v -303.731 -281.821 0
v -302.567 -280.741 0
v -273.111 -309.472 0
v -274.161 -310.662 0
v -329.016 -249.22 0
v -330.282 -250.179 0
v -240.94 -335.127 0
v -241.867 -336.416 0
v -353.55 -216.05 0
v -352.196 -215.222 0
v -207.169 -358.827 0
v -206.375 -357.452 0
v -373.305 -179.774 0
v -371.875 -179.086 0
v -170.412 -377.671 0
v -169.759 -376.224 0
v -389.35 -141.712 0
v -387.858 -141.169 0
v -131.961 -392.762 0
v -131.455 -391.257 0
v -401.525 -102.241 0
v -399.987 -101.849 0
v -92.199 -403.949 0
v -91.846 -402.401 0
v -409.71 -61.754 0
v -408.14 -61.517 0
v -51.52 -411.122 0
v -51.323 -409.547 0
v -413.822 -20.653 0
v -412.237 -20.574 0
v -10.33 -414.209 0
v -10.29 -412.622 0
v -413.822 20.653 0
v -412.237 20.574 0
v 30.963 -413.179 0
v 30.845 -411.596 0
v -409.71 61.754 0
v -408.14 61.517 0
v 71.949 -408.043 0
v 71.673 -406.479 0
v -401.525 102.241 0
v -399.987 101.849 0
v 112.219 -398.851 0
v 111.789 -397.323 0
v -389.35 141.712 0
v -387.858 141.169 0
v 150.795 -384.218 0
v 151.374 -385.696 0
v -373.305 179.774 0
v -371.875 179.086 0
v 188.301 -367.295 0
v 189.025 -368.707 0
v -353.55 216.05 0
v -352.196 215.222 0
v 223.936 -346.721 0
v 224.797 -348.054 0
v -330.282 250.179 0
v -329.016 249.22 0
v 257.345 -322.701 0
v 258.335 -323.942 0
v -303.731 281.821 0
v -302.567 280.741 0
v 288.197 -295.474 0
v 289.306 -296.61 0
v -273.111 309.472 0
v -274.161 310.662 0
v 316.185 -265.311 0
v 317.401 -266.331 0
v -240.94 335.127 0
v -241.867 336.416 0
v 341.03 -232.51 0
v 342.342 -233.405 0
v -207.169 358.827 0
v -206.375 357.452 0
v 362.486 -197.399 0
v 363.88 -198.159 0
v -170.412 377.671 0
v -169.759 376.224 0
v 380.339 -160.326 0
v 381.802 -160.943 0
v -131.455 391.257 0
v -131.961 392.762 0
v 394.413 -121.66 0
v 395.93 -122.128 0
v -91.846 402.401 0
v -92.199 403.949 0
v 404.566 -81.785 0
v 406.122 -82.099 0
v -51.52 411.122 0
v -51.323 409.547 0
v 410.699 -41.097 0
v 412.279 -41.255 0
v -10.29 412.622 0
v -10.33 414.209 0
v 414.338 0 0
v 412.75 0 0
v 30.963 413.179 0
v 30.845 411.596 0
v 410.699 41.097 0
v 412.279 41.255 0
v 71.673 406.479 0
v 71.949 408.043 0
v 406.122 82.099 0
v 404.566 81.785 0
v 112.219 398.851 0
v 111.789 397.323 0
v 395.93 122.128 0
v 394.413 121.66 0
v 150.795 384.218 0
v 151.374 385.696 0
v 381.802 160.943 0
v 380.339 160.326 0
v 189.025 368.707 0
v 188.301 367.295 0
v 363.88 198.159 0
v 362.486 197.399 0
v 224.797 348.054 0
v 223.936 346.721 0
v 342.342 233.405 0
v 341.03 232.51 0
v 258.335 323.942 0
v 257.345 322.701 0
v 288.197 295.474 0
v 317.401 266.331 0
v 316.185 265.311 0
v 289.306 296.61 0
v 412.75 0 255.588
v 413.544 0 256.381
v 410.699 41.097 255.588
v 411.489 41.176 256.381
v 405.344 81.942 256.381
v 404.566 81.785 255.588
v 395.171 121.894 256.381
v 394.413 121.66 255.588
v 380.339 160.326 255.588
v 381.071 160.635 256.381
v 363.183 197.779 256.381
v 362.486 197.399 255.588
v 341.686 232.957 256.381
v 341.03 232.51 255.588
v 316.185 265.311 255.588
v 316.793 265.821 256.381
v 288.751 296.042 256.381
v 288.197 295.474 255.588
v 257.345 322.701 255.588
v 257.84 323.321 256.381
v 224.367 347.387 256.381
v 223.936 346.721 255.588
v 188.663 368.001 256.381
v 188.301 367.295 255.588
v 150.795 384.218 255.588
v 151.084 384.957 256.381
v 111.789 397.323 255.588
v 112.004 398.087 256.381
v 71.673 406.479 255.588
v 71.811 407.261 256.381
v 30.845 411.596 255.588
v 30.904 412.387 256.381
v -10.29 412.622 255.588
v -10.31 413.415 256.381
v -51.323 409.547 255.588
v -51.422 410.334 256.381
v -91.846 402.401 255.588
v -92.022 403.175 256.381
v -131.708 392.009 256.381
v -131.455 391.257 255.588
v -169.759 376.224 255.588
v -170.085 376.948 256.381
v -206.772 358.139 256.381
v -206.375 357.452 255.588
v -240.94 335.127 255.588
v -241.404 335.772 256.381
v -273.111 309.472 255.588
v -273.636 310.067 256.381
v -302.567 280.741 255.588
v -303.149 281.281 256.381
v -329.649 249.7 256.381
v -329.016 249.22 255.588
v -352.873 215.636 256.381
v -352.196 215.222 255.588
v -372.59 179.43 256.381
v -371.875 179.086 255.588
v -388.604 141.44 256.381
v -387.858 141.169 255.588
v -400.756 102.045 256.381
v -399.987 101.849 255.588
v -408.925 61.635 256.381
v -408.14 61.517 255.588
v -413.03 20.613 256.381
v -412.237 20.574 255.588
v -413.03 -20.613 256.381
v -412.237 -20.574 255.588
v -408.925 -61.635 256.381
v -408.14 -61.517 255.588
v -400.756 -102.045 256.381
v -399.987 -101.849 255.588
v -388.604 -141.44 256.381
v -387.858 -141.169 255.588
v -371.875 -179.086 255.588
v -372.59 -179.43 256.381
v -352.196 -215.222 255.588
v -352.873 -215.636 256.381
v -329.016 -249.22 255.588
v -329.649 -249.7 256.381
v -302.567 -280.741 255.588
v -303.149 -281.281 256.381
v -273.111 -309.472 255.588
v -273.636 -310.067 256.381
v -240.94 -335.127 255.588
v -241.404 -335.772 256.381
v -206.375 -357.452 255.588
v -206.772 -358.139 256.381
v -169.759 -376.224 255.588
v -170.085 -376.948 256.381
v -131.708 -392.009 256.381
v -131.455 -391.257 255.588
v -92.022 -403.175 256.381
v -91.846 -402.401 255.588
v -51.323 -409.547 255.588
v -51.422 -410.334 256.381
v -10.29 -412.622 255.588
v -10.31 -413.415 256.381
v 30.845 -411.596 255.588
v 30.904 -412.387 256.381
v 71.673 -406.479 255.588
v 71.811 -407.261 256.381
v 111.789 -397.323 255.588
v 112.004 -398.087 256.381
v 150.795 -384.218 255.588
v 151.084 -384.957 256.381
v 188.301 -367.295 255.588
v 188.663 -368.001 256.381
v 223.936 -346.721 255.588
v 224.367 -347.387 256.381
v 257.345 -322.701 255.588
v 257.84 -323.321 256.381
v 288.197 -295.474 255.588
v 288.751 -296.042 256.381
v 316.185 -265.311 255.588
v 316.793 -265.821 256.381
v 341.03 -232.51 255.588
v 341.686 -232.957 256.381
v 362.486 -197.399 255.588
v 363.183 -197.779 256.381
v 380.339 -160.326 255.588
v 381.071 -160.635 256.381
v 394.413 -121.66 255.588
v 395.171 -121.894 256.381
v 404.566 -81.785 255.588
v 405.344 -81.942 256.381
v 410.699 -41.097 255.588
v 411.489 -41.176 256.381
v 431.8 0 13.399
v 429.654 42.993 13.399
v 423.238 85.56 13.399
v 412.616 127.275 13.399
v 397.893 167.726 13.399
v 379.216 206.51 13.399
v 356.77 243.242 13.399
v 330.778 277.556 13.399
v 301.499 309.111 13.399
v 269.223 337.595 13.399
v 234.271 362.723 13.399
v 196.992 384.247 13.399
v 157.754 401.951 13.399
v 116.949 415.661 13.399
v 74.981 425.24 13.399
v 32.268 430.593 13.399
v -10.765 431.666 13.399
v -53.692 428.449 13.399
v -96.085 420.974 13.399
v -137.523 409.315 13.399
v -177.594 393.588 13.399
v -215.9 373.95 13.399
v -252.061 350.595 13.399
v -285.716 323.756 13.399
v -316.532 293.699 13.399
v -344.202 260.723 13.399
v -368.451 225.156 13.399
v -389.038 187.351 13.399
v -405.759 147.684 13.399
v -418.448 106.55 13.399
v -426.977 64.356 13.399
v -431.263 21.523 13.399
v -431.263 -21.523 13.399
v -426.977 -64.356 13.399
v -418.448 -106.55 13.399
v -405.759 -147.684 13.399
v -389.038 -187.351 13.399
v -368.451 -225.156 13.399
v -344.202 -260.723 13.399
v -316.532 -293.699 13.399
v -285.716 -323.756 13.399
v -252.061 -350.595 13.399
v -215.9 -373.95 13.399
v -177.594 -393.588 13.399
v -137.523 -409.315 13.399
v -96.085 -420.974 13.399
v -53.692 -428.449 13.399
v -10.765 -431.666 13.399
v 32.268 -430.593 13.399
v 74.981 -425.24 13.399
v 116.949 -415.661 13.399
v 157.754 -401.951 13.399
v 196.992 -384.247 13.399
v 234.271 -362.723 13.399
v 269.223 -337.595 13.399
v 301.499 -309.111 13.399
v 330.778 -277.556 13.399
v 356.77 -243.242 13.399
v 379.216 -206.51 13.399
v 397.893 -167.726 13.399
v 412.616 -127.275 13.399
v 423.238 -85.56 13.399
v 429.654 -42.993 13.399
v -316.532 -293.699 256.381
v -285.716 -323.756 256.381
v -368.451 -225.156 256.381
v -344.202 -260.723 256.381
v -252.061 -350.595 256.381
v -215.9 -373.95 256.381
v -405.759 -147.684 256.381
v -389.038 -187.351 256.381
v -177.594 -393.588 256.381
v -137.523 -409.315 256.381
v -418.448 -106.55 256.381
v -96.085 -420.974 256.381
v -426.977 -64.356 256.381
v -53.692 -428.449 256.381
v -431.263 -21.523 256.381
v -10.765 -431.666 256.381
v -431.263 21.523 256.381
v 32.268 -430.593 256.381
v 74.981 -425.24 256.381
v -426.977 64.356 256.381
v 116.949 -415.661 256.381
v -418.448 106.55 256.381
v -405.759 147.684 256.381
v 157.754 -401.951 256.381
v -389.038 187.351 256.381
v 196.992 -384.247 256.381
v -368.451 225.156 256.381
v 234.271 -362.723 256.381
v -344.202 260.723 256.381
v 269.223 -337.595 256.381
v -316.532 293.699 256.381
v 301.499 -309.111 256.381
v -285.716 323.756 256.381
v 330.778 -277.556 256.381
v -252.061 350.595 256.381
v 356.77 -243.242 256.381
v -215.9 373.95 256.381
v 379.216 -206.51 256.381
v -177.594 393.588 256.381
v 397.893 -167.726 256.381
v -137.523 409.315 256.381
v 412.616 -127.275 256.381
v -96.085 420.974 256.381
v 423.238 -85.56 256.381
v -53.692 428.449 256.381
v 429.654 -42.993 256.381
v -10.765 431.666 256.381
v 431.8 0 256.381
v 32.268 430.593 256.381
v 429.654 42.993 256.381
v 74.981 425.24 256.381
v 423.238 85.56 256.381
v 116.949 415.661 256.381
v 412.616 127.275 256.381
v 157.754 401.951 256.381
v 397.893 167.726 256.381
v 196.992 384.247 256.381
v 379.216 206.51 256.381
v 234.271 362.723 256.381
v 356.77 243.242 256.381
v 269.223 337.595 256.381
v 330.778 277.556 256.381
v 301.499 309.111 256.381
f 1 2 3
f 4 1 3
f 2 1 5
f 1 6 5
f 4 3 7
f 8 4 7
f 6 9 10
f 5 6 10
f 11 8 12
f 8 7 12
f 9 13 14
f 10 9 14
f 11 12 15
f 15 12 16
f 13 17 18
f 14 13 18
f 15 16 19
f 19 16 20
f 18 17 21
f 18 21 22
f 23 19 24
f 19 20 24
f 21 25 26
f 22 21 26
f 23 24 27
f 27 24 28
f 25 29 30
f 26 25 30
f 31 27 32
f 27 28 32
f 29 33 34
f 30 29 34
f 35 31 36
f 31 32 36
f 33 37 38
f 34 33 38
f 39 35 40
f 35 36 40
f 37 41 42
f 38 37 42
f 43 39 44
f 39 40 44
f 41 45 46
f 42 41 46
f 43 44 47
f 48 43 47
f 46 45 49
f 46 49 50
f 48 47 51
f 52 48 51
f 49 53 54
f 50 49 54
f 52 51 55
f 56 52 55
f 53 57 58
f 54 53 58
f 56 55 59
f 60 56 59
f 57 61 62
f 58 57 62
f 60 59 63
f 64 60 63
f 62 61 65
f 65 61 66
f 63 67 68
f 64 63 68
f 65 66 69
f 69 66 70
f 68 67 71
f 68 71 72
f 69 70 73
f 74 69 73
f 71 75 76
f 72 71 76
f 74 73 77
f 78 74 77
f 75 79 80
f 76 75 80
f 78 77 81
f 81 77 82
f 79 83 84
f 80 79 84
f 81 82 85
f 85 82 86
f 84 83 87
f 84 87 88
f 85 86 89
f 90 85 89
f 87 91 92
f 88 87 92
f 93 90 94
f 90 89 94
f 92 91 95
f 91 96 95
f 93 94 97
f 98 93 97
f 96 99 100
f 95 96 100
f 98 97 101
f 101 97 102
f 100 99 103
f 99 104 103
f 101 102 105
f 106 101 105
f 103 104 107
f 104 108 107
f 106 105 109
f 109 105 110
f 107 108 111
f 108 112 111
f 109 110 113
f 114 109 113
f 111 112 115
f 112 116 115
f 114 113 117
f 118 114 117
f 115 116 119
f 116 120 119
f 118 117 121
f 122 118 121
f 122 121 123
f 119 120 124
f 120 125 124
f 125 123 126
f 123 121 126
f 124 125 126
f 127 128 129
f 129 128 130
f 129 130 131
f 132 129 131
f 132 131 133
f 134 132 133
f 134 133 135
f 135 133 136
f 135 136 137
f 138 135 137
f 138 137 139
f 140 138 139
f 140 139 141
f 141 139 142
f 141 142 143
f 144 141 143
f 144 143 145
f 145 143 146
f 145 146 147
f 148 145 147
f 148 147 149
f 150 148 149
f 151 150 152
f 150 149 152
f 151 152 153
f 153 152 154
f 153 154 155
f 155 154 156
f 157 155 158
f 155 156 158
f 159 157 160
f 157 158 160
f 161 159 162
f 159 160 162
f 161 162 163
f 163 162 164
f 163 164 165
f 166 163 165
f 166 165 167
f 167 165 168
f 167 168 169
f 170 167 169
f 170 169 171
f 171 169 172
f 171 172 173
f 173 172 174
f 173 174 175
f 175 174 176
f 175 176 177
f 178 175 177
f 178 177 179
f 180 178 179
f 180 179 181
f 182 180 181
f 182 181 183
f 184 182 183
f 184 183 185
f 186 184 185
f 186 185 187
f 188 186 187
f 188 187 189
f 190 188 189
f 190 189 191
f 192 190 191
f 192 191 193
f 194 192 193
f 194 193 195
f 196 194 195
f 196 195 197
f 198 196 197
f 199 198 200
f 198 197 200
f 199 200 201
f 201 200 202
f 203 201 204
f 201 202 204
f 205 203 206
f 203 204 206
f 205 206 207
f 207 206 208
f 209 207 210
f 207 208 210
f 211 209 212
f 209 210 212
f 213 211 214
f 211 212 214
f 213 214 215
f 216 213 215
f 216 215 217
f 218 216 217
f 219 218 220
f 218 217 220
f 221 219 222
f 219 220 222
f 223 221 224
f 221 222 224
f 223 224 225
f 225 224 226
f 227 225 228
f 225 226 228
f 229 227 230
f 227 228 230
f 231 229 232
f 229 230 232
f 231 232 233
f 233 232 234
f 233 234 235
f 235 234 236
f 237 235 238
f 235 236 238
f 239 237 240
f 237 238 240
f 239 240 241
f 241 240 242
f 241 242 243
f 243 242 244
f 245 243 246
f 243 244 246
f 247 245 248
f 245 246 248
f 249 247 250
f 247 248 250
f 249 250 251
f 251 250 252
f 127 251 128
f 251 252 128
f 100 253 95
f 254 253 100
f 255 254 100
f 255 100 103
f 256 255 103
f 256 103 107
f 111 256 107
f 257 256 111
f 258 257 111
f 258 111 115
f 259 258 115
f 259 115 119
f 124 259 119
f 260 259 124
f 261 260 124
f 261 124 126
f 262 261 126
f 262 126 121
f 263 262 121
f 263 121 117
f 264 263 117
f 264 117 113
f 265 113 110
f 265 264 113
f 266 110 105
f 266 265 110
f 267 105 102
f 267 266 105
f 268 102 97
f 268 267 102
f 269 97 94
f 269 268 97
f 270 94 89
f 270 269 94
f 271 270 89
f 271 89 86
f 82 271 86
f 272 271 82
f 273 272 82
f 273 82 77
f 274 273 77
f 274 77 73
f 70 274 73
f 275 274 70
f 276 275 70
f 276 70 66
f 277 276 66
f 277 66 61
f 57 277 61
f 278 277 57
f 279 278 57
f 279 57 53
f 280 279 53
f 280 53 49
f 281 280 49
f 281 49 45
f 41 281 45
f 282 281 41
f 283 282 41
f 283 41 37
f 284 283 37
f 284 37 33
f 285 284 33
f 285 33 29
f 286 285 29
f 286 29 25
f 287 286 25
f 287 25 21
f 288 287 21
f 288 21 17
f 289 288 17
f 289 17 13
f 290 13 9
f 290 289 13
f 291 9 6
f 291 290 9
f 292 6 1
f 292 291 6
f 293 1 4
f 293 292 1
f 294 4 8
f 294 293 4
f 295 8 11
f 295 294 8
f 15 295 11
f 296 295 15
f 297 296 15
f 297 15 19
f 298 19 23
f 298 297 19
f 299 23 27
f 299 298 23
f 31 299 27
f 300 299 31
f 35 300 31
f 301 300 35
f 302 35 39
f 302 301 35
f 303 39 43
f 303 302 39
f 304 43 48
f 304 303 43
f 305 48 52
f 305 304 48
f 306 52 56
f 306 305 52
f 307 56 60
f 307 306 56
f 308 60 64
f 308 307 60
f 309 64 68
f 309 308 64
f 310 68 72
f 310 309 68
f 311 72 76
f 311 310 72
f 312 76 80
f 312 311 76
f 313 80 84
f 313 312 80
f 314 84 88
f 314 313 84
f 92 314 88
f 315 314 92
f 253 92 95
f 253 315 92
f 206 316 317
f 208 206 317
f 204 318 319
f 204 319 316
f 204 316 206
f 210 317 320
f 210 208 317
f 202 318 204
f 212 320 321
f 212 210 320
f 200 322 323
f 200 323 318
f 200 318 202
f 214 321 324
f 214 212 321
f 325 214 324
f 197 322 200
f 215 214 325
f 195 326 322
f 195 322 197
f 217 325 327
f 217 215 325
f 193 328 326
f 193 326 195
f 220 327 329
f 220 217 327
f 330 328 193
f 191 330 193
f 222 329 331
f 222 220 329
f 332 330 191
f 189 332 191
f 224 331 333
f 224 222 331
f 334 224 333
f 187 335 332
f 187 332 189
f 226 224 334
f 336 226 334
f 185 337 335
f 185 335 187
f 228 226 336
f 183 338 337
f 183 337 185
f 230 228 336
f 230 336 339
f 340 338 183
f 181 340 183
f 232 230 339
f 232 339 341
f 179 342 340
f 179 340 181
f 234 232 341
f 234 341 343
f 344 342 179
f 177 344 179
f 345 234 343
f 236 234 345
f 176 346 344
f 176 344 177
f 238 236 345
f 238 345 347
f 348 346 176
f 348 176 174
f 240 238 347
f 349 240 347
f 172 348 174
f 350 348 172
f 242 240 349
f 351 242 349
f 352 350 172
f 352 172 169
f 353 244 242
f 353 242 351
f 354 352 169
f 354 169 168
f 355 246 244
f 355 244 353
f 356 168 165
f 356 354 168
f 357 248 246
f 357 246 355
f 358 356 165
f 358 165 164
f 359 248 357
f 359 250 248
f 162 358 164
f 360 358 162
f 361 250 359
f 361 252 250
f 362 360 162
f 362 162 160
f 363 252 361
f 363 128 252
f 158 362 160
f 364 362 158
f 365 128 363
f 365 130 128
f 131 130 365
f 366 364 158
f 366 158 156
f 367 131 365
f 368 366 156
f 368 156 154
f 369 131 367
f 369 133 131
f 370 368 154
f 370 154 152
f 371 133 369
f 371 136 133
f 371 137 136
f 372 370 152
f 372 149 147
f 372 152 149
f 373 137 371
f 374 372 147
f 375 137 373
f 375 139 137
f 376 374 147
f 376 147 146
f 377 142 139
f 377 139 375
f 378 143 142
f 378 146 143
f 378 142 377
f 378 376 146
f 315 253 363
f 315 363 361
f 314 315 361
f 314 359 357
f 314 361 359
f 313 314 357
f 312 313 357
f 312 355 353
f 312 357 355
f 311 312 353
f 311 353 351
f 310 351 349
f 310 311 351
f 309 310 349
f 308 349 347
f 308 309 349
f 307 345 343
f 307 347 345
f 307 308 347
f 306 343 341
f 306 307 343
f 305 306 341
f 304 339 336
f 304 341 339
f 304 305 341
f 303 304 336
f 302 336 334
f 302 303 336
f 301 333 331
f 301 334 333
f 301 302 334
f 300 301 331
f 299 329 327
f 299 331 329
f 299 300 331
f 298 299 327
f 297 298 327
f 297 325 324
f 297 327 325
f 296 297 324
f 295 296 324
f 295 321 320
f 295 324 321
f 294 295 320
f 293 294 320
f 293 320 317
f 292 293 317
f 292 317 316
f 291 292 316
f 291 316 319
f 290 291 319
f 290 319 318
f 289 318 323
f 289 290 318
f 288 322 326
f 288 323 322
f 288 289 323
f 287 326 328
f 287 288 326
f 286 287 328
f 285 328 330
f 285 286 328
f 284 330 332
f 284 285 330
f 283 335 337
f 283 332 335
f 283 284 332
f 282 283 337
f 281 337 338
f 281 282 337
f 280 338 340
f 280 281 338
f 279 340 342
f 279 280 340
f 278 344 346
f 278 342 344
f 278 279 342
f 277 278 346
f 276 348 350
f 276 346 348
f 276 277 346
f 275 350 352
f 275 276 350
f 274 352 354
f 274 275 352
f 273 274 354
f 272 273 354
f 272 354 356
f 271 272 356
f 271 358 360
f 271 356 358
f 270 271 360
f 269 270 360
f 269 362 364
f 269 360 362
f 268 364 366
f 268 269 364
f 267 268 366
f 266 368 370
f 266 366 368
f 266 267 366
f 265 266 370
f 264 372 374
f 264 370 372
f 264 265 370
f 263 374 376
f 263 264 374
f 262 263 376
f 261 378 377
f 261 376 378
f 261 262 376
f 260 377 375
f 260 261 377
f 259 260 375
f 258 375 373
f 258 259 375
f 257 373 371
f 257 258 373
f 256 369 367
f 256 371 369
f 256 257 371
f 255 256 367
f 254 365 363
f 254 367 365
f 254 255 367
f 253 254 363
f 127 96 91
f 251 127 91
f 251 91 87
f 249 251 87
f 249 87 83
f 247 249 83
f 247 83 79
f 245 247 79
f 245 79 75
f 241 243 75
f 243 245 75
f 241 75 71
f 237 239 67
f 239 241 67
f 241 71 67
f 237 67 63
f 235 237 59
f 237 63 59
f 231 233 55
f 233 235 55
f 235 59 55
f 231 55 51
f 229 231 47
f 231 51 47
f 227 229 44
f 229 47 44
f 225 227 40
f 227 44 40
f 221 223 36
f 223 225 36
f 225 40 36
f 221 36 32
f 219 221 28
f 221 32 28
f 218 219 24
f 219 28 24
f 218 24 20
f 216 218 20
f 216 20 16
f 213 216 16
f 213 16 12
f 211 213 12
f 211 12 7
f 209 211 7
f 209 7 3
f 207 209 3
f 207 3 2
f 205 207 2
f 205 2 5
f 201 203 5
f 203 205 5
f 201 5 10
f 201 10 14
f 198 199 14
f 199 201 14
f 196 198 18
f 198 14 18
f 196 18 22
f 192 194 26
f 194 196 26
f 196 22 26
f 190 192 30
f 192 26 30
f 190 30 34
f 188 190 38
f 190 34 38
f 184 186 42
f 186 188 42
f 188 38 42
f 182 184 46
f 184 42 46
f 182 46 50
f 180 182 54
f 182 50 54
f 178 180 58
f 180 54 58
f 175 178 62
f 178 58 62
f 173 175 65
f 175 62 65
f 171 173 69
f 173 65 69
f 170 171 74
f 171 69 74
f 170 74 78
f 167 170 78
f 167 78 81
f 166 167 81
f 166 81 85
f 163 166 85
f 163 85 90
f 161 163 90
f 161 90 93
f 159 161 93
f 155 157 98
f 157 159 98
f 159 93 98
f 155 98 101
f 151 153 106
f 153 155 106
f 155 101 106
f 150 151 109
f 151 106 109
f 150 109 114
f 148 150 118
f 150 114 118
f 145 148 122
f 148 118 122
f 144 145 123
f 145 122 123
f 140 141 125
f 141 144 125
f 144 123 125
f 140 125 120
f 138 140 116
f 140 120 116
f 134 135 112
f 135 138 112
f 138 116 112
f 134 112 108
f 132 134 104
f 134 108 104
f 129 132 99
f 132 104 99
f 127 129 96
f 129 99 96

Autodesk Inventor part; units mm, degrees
ref_plane "YZ Plane" through (0, 0, 0) normal (1, 0, 0) x (0, 1, 0)
ref_plane "XZ Plane" through (0, 0, 0) normal (0, 1, 0) x (-1, 0, 0)
sketch "Sketch1" plane through (0, 0, 0) normal (0, 0, 1) x (1, 0, 0)
  circle A0 centre (0, 0) radius 431.8
  circle A1 centre (0, 0) radius 412.75
  dimension "d0" = 863.6
  dimension "d1" = 825.5
extrude "Extrusion1" add sketch "Sketch1" along normal blind 256.3812
chamfer "Chamfer1" distance 17.4625 angle 37.5 1 edges at (-431.8, 0, 0) measured on face at (-425.2038, 4.7488, 0)
ref_plane "Work Plane2" through (0, 0, 224.6312) normal (0, 0, 1) x (1, 0, 0)
ref_plane "Work Plane1" through (0, 0, 205.5812) normal (0, 0, 1) x (1, 0, 0)
split_face "Split1"
split_face "Split2"
chamfer "Chamfer2" distance 0.7937 angle 45 1 edges at (-412.75, 0, 256.3812)
properties part number "A1-19037-200-03 34in pipe" material "Steel, Mild"
